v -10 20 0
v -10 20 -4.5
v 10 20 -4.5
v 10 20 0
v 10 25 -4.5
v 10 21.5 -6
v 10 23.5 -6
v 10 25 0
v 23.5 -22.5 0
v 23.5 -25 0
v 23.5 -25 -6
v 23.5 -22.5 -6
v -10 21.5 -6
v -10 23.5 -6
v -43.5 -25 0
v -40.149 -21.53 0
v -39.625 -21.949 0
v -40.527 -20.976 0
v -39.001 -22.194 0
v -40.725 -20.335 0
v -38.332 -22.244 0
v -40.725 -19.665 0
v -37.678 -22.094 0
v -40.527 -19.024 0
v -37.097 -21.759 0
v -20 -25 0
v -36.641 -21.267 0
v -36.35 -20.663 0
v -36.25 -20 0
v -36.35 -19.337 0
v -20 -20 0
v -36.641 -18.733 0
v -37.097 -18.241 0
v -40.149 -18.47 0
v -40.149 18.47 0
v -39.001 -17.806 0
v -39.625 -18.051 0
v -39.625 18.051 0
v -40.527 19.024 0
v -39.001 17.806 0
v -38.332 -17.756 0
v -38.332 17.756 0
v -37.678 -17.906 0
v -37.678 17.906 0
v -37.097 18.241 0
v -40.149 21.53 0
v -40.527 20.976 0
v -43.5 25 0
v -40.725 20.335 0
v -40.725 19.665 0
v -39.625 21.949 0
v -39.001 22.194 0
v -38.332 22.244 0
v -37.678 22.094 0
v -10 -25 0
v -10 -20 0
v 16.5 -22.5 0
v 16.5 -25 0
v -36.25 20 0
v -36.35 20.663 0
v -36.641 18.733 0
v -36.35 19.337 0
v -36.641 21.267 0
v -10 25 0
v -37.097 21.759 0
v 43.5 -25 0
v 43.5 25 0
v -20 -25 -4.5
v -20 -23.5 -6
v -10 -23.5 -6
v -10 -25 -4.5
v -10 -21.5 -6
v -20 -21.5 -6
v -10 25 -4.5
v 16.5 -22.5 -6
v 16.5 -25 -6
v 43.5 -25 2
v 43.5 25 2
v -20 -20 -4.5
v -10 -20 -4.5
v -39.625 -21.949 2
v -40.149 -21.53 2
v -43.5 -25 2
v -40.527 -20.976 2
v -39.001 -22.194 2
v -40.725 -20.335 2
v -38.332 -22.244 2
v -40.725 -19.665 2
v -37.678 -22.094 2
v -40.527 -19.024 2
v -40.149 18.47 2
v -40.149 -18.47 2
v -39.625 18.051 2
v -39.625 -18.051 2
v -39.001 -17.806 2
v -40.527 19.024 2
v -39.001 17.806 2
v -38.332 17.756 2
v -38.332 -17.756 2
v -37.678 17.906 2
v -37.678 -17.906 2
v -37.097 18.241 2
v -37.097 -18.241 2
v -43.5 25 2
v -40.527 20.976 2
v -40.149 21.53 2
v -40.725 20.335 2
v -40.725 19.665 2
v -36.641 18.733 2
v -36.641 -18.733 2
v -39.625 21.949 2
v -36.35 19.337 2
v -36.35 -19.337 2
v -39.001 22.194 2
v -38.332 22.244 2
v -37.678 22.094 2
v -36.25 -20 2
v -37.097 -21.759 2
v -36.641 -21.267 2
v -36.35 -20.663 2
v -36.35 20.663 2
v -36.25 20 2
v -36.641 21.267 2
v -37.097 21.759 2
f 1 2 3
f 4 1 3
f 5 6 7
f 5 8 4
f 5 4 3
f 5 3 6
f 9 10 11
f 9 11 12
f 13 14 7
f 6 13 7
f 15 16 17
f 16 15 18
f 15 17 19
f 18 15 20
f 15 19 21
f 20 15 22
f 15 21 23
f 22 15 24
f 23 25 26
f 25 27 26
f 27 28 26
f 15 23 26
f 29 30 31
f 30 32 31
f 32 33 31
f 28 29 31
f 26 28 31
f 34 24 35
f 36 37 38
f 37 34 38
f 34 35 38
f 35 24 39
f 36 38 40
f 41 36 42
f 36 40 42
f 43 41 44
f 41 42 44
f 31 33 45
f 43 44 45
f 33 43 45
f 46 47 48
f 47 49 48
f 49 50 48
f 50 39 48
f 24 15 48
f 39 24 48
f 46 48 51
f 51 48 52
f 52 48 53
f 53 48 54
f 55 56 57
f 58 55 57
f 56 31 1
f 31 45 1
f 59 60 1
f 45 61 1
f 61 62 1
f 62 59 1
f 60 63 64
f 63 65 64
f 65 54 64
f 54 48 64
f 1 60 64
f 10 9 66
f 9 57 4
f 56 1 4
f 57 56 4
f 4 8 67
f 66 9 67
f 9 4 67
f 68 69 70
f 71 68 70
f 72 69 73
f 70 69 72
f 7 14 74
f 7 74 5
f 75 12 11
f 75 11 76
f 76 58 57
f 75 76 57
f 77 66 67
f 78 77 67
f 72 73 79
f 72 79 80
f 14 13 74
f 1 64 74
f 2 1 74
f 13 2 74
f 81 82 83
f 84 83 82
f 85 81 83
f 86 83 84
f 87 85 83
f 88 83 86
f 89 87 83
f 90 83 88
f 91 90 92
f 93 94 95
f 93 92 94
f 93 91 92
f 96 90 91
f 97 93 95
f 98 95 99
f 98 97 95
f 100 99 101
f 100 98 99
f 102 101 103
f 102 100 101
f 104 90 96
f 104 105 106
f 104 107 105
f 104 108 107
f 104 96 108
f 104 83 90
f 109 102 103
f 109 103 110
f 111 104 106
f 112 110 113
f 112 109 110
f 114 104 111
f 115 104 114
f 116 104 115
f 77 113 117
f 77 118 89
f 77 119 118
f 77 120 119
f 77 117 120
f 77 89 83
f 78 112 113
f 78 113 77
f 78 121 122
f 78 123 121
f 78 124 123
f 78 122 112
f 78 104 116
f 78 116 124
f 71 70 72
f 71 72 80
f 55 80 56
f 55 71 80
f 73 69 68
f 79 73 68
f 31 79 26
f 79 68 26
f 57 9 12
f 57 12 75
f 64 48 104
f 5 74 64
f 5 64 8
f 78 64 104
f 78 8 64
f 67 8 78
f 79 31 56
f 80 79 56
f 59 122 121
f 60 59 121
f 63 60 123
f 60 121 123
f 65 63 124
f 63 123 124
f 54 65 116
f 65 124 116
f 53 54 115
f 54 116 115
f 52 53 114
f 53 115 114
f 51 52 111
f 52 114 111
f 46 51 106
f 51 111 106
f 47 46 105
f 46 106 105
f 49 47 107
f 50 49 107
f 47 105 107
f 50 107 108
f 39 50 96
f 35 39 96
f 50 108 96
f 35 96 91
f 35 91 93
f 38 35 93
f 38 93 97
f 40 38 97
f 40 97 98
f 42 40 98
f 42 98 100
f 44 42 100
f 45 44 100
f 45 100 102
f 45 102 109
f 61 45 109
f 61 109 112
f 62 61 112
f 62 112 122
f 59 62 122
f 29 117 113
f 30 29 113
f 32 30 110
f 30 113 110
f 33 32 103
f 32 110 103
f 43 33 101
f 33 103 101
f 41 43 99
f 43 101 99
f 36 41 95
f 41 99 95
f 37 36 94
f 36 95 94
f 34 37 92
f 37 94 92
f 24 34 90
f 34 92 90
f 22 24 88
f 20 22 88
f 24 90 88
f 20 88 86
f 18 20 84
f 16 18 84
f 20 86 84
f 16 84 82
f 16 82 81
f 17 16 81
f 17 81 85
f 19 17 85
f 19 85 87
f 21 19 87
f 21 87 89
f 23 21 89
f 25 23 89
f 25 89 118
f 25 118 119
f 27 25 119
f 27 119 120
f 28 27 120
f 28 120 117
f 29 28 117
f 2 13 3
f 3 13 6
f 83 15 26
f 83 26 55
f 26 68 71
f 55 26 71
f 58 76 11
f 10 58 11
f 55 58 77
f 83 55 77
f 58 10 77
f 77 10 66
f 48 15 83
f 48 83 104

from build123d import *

# Parameters (mm, degrees)
SKETCH1_W            = 87
SKETCH1_H            = 50
BOSS_EXTRUDE1_DEPTH  = 2
SKETCH3_W            = 20
SKETCH3_H            = 6
BOSS_EXTRUDE2_DEPTH  = 5
CHAMFER1_SIZE        = 1.5
SKETCH4_W            = 10
SKETCH4_H            = 6
BOSS_EXTRUDE3_DEPTH  = 5
CHAMFER2_SIZE        = 1.5
SKETCH5_W            = 7
SKETCH5_H            = 2.5
BOSS_EXTRUDE4_DEPTH  = 6
M4_CLEARANCE_HOLE1_D = 4.5


with BuildPart() as part:
    # Sketch1 → Boss-Extrude1 (new body)
    with BuildSketch(Plane.XY):
        Rectangle(SKETCH1_W, SKETCH1_H)
    extrude(amount=BOSS_EXTRUDE1_DEPTH)

    # Sketch3 → Boss-Extrude2 (add)
    with BuildSketch(Plane(origin=(0, 25, 0), x_dir=(1, 0, 0), z_dir=(0, 1, 0))):
        with Locations((0, 3)):
            Rectangle(SKETCH3_W, SKETCH3_H)
    extrude(amount=-BOSS_EXTRUDE2_DEPTH)

    # Chamfer1
    chamfer1_edges = [part.edges().sort_by_distance(p)[0] for p in [
        (0, 20, -6),
        (0, 25, -6),
    ]]
    chamfer(chamfer1_edges, length=CHAMFER1_SIZE)

    # Sketch4 → Boss-Extrude3 (add)
    with BuildSketch(Plane.XZ.offset(25)):
        with Locations((-15, -3)):
            Rectangle(SKETCH4_W, SKETCH4_H)
    extrude(amount=-BOSS_EXTRUDE3_DEPTH)

    # Chamfer2
    chamfer2_edges = [part.edges().sort_by_distance(p)[0] for p in [
        (-15, -20, -6),
        (-15, -25, -6),
    ]]
    chamfer(chamfer2_edges, length=CHAMFER2_SIZE)

    # Sketch5 → Boss-Extrude4 (add)
    with BuildSketch(Plane(origin=(0, 0, 0), x_dir=(-1, 0, 0), z_dir=(0, 0, -1))):
        with Locations((-20, -23.75)):
            Rectangle(SKETCH5_W, SKETCH5_H)
    extrude(amount=BOSS_EXTRUDE4_DEPTH)

    # M4 Clearance Hole1 (through all)
    with Locations(Plane(origin=(0, 0, 0), x_dir=(-1, 0, 0), z_dir=(0, 0, -1))):
        with Locations((38.5, -20), (38.5, 20)):
            Hole(M4_CLEARANCE_HOLE1_D / 2)


solid = part.part
